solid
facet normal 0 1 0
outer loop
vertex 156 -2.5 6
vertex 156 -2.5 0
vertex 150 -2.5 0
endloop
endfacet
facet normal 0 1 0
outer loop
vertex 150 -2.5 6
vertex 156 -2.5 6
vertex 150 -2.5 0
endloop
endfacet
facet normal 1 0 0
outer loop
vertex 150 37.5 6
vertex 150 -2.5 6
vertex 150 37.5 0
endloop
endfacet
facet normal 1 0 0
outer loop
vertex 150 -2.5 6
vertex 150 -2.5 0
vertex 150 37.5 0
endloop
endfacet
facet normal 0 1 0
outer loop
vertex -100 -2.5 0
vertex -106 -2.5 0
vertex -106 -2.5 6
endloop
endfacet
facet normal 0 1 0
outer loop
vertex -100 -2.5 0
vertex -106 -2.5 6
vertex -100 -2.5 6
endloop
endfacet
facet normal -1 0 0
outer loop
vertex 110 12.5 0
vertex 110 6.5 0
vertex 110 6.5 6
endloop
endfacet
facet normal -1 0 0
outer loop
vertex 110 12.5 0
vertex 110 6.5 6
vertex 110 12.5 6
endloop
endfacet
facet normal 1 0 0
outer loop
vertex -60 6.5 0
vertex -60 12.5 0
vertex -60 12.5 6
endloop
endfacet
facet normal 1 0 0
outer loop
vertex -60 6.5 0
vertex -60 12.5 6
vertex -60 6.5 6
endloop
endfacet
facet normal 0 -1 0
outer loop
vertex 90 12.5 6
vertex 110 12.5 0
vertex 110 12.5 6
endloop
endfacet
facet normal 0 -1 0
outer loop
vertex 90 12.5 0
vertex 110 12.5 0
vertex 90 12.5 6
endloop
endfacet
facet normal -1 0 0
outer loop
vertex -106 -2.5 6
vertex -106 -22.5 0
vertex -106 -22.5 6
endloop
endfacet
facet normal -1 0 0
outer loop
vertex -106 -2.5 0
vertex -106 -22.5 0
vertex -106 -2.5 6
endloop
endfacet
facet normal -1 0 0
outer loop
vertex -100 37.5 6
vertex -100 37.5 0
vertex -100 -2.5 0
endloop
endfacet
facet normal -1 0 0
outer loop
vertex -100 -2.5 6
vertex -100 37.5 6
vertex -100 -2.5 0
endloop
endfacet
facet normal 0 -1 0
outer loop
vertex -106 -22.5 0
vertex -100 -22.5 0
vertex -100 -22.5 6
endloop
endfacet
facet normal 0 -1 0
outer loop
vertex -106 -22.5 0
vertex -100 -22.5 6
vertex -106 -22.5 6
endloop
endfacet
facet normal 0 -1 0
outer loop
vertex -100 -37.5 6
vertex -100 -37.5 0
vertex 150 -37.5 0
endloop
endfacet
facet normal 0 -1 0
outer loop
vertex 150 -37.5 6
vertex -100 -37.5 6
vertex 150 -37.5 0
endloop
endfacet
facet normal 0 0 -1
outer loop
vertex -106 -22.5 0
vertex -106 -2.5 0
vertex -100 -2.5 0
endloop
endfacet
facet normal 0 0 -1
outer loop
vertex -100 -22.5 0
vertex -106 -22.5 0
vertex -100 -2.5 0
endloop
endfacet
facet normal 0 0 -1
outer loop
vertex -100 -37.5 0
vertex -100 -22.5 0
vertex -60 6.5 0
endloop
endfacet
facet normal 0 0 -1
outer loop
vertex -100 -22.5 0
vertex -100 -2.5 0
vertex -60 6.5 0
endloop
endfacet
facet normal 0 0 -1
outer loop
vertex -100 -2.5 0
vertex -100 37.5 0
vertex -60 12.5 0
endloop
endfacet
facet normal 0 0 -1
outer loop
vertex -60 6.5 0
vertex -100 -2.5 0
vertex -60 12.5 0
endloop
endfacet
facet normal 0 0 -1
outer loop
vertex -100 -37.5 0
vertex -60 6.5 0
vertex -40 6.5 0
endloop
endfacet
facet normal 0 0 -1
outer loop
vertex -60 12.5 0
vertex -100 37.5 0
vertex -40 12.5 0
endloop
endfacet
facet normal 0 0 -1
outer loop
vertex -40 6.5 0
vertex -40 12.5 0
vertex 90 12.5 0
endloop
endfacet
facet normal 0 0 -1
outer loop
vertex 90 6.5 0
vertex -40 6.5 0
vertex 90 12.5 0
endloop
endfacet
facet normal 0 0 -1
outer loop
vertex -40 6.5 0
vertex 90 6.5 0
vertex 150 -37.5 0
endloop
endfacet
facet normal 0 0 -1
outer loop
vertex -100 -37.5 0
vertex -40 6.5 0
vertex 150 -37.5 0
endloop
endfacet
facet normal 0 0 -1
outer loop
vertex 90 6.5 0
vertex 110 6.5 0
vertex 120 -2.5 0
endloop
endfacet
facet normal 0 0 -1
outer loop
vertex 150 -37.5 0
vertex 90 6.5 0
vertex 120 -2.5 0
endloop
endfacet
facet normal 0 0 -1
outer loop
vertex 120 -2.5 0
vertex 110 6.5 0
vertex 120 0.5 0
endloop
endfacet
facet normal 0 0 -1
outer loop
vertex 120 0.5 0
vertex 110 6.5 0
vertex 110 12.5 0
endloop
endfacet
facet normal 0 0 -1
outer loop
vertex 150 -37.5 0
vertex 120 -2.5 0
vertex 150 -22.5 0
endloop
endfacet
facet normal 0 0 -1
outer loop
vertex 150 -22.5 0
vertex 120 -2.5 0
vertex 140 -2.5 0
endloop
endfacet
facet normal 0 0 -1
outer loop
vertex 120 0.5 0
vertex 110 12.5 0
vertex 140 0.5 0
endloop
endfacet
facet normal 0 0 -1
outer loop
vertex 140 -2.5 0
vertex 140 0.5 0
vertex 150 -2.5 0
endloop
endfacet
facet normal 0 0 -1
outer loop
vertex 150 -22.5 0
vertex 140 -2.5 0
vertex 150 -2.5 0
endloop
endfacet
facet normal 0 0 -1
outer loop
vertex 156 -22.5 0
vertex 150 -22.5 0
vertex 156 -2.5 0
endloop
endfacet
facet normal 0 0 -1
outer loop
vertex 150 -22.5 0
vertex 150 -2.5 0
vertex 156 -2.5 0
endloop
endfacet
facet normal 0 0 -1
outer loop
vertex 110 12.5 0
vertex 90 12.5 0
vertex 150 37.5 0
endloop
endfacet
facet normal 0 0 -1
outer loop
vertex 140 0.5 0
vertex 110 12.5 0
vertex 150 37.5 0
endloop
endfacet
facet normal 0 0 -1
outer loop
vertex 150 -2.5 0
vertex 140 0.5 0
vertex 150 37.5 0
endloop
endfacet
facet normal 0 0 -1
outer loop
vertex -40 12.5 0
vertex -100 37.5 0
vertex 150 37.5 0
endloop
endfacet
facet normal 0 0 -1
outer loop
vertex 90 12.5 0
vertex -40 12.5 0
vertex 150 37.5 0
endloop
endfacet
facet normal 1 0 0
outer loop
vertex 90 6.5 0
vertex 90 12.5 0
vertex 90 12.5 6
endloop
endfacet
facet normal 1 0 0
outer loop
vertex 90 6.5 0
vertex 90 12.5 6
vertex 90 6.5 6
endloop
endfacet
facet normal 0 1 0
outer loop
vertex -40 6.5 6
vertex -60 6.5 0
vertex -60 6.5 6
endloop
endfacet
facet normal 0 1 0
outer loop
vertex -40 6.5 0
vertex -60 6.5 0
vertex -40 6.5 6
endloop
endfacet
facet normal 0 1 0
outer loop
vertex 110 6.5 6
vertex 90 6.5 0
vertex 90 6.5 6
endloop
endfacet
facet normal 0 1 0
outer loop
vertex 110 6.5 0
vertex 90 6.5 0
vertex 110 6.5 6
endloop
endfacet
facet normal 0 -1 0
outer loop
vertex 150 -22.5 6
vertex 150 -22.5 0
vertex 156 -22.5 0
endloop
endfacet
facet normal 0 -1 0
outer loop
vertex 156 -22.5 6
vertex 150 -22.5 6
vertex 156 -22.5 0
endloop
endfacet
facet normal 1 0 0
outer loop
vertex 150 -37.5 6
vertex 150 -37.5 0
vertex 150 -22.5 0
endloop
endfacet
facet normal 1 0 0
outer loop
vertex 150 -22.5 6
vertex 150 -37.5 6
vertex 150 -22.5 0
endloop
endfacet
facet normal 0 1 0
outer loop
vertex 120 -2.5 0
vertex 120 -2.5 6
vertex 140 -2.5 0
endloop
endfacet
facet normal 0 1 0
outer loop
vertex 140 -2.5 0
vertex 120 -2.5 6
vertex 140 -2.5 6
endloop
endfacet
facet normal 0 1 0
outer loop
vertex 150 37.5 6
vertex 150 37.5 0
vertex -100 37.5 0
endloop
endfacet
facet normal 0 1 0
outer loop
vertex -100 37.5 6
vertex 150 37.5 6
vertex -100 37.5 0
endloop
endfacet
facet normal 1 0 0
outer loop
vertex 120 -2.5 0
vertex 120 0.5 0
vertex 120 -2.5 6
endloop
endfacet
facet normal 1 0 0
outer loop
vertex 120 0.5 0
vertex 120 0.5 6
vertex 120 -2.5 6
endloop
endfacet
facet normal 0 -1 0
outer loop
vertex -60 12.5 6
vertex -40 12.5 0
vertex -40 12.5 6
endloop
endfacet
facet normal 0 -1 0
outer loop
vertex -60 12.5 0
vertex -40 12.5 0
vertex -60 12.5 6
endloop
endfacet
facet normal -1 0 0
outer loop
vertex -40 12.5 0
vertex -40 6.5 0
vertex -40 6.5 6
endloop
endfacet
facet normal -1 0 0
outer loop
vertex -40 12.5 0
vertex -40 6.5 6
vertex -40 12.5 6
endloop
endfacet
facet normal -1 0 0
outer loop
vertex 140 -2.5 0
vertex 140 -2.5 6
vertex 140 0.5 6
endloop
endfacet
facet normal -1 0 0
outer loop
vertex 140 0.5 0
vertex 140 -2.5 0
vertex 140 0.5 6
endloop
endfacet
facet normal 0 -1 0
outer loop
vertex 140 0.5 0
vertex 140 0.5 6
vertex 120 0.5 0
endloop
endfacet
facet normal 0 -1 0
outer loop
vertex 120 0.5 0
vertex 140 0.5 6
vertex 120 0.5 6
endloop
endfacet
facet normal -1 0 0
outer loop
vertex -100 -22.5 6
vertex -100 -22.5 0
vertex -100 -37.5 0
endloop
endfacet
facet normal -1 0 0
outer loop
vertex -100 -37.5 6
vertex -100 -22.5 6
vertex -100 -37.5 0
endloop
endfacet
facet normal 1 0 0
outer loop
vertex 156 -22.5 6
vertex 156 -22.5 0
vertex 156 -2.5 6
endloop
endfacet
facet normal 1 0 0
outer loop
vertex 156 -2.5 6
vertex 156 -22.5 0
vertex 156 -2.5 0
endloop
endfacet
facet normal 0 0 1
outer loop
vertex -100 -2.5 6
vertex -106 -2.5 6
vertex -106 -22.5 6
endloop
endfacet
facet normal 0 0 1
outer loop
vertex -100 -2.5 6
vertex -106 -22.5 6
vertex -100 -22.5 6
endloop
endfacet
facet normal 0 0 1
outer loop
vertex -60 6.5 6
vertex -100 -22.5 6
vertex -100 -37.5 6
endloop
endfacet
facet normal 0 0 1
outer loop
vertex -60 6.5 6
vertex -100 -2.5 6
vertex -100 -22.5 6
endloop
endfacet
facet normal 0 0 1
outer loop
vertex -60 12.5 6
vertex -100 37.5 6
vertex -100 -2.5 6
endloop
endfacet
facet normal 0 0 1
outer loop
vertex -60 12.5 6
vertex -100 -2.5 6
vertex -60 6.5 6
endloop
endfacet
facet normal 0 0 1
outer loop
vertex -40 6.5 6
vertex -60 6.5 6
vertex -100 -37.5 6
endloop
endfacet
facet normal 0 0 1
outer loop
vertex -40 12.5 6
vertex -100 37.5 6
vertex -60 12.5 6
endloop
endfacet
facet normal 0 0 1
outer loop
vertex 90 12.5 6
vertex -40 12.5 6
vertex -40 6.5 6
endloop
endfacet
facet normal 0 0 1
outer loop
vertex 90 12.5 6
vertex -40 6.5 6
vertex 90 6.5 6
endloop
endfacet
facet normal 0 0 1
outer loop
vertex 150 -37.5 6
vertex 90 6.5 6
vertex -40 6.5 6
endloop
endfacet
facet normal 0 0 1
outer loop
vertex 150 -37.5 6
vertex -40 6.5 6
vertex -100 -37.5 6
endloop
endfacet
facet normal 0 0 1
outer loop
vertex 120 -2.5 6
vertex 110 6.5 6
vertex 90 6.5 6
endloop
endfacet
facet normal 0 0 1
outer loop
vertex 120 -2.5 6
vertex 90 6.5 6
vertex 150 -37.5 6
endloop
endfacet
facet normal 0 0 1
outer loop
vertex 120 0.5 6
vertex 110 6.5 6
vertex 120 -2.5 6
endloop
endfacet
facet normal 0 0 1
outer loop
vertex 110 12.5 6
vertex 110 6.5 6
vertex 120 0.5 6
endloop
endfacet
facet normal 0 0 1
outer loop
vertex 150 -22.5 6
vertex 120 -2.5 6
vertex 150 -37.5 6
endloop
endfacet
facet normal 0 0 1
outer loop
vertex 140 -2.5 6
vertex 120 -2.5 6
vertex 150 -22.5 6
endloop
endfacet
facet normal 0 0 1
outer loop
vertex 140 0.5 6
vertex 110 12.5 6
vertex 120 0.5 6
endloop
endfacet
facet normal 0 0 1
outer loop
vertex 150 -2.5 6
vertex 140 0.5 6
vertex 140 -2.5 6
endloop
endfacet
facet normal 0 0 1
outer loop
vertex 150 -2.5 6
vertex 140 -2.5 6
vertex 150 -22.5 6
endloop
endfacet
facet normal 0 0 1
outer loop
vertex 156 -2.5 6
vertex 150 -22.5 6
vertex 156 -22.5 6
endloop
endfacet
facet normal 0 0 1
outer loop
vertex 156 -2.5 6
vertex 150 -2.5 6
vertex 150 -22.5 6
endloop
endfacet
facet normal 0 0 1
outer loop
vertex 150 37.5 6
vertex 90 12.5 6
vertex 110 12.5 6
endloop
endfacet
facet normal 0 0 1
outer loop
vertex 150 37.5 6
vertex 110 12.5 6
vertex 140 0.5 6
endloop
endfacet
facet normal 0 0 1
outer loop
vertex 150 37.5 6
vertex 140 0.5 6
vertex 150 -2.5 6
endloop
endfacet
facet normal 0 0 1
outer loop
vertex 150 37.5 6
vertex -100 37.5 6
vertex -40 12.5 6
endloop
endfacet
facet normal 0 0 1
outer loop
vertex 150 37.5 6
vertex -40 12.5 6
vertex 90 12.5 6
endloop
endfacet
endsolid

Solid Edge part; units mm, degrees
sketch "Sketch1" plane through (0, 0, 0) normal (0, 0, 1) x (1, 0, 0)
  line L0 (-60, 6.5) -> (-40, 6.5)
  line L1 (-40, 6.5) -> (-40, 12.5)
  line L2 (-40, 12.5) -> (-60, 12.5)
  line L3 (-60, 12.5) -> (-60, 6.5)
  line L4 (90, 6.5) -> (110, 6.5)
  line L5 (110, 6.5) -> (110, 12.5)
  line L6 (110, 12.5) -> (90, 12.5)
  line L7 (90, 12.5) -> (90, 6.5)
  line L8 (150, -37.5) -> (150, -22.5)
  line L9 (150, -22.5) -> (156, -22.5)
  line L10 (156, -22.5) -> (156, -2.5)
  line L11 (156, -2.5) -> (150, -2.5)
  line L12 (150, -2.5) -> (150, 37.5)
  line L13 (150, 37.5) -> (-100, 37.5)
  line L14 (-100, 37.5) -> (-100, -2.5)
  line L15 (-106, -2.5) -> (-100, -2.5)
  line L16 (-106, -22.5) -> (-106, -2.5)
  line L17 (-100, -22.5) -> (-106, -22.5)
  line L18 (-100, -22.5) -> (-100, -37.5)
  line L19 (-100, -37.5) -> (150, -37.5)
  dimension "D1" = 6
  dimension "D2" = 20
  dimension "D3" = 20
  dimension "D4" = 6
  dimension "D5" = 20
  dimension "D6" = 6
  dimension "D7" = 20
  dimension "D8" = 40
  dimension "D9" = 40
  dimension "D10" = 250
  dimension "D11" = 6
  dimension "D12" = 6
extrude "Protrusion1" add sketch "Sketch1" along normal blind 6
sketch "Sketch2" plane through (25, 0, 6) normal (0, 0, 1) x (1, 0, 0)
  line L0 (95, -2.5) -> (115, -2.5)
  line L1 (115, -2.5) -> (115, 0.5)
  line L2 (115, 0.5) -> (95, 0.5)
  line L3 (95, 0.5) -> (95, -2.5)
  dimension "D1" = 20
  dimension "D2" = 3
  dimension "D3" = 10
extrude "Cutout1" cut sketch "Sketch2" against normal through all
